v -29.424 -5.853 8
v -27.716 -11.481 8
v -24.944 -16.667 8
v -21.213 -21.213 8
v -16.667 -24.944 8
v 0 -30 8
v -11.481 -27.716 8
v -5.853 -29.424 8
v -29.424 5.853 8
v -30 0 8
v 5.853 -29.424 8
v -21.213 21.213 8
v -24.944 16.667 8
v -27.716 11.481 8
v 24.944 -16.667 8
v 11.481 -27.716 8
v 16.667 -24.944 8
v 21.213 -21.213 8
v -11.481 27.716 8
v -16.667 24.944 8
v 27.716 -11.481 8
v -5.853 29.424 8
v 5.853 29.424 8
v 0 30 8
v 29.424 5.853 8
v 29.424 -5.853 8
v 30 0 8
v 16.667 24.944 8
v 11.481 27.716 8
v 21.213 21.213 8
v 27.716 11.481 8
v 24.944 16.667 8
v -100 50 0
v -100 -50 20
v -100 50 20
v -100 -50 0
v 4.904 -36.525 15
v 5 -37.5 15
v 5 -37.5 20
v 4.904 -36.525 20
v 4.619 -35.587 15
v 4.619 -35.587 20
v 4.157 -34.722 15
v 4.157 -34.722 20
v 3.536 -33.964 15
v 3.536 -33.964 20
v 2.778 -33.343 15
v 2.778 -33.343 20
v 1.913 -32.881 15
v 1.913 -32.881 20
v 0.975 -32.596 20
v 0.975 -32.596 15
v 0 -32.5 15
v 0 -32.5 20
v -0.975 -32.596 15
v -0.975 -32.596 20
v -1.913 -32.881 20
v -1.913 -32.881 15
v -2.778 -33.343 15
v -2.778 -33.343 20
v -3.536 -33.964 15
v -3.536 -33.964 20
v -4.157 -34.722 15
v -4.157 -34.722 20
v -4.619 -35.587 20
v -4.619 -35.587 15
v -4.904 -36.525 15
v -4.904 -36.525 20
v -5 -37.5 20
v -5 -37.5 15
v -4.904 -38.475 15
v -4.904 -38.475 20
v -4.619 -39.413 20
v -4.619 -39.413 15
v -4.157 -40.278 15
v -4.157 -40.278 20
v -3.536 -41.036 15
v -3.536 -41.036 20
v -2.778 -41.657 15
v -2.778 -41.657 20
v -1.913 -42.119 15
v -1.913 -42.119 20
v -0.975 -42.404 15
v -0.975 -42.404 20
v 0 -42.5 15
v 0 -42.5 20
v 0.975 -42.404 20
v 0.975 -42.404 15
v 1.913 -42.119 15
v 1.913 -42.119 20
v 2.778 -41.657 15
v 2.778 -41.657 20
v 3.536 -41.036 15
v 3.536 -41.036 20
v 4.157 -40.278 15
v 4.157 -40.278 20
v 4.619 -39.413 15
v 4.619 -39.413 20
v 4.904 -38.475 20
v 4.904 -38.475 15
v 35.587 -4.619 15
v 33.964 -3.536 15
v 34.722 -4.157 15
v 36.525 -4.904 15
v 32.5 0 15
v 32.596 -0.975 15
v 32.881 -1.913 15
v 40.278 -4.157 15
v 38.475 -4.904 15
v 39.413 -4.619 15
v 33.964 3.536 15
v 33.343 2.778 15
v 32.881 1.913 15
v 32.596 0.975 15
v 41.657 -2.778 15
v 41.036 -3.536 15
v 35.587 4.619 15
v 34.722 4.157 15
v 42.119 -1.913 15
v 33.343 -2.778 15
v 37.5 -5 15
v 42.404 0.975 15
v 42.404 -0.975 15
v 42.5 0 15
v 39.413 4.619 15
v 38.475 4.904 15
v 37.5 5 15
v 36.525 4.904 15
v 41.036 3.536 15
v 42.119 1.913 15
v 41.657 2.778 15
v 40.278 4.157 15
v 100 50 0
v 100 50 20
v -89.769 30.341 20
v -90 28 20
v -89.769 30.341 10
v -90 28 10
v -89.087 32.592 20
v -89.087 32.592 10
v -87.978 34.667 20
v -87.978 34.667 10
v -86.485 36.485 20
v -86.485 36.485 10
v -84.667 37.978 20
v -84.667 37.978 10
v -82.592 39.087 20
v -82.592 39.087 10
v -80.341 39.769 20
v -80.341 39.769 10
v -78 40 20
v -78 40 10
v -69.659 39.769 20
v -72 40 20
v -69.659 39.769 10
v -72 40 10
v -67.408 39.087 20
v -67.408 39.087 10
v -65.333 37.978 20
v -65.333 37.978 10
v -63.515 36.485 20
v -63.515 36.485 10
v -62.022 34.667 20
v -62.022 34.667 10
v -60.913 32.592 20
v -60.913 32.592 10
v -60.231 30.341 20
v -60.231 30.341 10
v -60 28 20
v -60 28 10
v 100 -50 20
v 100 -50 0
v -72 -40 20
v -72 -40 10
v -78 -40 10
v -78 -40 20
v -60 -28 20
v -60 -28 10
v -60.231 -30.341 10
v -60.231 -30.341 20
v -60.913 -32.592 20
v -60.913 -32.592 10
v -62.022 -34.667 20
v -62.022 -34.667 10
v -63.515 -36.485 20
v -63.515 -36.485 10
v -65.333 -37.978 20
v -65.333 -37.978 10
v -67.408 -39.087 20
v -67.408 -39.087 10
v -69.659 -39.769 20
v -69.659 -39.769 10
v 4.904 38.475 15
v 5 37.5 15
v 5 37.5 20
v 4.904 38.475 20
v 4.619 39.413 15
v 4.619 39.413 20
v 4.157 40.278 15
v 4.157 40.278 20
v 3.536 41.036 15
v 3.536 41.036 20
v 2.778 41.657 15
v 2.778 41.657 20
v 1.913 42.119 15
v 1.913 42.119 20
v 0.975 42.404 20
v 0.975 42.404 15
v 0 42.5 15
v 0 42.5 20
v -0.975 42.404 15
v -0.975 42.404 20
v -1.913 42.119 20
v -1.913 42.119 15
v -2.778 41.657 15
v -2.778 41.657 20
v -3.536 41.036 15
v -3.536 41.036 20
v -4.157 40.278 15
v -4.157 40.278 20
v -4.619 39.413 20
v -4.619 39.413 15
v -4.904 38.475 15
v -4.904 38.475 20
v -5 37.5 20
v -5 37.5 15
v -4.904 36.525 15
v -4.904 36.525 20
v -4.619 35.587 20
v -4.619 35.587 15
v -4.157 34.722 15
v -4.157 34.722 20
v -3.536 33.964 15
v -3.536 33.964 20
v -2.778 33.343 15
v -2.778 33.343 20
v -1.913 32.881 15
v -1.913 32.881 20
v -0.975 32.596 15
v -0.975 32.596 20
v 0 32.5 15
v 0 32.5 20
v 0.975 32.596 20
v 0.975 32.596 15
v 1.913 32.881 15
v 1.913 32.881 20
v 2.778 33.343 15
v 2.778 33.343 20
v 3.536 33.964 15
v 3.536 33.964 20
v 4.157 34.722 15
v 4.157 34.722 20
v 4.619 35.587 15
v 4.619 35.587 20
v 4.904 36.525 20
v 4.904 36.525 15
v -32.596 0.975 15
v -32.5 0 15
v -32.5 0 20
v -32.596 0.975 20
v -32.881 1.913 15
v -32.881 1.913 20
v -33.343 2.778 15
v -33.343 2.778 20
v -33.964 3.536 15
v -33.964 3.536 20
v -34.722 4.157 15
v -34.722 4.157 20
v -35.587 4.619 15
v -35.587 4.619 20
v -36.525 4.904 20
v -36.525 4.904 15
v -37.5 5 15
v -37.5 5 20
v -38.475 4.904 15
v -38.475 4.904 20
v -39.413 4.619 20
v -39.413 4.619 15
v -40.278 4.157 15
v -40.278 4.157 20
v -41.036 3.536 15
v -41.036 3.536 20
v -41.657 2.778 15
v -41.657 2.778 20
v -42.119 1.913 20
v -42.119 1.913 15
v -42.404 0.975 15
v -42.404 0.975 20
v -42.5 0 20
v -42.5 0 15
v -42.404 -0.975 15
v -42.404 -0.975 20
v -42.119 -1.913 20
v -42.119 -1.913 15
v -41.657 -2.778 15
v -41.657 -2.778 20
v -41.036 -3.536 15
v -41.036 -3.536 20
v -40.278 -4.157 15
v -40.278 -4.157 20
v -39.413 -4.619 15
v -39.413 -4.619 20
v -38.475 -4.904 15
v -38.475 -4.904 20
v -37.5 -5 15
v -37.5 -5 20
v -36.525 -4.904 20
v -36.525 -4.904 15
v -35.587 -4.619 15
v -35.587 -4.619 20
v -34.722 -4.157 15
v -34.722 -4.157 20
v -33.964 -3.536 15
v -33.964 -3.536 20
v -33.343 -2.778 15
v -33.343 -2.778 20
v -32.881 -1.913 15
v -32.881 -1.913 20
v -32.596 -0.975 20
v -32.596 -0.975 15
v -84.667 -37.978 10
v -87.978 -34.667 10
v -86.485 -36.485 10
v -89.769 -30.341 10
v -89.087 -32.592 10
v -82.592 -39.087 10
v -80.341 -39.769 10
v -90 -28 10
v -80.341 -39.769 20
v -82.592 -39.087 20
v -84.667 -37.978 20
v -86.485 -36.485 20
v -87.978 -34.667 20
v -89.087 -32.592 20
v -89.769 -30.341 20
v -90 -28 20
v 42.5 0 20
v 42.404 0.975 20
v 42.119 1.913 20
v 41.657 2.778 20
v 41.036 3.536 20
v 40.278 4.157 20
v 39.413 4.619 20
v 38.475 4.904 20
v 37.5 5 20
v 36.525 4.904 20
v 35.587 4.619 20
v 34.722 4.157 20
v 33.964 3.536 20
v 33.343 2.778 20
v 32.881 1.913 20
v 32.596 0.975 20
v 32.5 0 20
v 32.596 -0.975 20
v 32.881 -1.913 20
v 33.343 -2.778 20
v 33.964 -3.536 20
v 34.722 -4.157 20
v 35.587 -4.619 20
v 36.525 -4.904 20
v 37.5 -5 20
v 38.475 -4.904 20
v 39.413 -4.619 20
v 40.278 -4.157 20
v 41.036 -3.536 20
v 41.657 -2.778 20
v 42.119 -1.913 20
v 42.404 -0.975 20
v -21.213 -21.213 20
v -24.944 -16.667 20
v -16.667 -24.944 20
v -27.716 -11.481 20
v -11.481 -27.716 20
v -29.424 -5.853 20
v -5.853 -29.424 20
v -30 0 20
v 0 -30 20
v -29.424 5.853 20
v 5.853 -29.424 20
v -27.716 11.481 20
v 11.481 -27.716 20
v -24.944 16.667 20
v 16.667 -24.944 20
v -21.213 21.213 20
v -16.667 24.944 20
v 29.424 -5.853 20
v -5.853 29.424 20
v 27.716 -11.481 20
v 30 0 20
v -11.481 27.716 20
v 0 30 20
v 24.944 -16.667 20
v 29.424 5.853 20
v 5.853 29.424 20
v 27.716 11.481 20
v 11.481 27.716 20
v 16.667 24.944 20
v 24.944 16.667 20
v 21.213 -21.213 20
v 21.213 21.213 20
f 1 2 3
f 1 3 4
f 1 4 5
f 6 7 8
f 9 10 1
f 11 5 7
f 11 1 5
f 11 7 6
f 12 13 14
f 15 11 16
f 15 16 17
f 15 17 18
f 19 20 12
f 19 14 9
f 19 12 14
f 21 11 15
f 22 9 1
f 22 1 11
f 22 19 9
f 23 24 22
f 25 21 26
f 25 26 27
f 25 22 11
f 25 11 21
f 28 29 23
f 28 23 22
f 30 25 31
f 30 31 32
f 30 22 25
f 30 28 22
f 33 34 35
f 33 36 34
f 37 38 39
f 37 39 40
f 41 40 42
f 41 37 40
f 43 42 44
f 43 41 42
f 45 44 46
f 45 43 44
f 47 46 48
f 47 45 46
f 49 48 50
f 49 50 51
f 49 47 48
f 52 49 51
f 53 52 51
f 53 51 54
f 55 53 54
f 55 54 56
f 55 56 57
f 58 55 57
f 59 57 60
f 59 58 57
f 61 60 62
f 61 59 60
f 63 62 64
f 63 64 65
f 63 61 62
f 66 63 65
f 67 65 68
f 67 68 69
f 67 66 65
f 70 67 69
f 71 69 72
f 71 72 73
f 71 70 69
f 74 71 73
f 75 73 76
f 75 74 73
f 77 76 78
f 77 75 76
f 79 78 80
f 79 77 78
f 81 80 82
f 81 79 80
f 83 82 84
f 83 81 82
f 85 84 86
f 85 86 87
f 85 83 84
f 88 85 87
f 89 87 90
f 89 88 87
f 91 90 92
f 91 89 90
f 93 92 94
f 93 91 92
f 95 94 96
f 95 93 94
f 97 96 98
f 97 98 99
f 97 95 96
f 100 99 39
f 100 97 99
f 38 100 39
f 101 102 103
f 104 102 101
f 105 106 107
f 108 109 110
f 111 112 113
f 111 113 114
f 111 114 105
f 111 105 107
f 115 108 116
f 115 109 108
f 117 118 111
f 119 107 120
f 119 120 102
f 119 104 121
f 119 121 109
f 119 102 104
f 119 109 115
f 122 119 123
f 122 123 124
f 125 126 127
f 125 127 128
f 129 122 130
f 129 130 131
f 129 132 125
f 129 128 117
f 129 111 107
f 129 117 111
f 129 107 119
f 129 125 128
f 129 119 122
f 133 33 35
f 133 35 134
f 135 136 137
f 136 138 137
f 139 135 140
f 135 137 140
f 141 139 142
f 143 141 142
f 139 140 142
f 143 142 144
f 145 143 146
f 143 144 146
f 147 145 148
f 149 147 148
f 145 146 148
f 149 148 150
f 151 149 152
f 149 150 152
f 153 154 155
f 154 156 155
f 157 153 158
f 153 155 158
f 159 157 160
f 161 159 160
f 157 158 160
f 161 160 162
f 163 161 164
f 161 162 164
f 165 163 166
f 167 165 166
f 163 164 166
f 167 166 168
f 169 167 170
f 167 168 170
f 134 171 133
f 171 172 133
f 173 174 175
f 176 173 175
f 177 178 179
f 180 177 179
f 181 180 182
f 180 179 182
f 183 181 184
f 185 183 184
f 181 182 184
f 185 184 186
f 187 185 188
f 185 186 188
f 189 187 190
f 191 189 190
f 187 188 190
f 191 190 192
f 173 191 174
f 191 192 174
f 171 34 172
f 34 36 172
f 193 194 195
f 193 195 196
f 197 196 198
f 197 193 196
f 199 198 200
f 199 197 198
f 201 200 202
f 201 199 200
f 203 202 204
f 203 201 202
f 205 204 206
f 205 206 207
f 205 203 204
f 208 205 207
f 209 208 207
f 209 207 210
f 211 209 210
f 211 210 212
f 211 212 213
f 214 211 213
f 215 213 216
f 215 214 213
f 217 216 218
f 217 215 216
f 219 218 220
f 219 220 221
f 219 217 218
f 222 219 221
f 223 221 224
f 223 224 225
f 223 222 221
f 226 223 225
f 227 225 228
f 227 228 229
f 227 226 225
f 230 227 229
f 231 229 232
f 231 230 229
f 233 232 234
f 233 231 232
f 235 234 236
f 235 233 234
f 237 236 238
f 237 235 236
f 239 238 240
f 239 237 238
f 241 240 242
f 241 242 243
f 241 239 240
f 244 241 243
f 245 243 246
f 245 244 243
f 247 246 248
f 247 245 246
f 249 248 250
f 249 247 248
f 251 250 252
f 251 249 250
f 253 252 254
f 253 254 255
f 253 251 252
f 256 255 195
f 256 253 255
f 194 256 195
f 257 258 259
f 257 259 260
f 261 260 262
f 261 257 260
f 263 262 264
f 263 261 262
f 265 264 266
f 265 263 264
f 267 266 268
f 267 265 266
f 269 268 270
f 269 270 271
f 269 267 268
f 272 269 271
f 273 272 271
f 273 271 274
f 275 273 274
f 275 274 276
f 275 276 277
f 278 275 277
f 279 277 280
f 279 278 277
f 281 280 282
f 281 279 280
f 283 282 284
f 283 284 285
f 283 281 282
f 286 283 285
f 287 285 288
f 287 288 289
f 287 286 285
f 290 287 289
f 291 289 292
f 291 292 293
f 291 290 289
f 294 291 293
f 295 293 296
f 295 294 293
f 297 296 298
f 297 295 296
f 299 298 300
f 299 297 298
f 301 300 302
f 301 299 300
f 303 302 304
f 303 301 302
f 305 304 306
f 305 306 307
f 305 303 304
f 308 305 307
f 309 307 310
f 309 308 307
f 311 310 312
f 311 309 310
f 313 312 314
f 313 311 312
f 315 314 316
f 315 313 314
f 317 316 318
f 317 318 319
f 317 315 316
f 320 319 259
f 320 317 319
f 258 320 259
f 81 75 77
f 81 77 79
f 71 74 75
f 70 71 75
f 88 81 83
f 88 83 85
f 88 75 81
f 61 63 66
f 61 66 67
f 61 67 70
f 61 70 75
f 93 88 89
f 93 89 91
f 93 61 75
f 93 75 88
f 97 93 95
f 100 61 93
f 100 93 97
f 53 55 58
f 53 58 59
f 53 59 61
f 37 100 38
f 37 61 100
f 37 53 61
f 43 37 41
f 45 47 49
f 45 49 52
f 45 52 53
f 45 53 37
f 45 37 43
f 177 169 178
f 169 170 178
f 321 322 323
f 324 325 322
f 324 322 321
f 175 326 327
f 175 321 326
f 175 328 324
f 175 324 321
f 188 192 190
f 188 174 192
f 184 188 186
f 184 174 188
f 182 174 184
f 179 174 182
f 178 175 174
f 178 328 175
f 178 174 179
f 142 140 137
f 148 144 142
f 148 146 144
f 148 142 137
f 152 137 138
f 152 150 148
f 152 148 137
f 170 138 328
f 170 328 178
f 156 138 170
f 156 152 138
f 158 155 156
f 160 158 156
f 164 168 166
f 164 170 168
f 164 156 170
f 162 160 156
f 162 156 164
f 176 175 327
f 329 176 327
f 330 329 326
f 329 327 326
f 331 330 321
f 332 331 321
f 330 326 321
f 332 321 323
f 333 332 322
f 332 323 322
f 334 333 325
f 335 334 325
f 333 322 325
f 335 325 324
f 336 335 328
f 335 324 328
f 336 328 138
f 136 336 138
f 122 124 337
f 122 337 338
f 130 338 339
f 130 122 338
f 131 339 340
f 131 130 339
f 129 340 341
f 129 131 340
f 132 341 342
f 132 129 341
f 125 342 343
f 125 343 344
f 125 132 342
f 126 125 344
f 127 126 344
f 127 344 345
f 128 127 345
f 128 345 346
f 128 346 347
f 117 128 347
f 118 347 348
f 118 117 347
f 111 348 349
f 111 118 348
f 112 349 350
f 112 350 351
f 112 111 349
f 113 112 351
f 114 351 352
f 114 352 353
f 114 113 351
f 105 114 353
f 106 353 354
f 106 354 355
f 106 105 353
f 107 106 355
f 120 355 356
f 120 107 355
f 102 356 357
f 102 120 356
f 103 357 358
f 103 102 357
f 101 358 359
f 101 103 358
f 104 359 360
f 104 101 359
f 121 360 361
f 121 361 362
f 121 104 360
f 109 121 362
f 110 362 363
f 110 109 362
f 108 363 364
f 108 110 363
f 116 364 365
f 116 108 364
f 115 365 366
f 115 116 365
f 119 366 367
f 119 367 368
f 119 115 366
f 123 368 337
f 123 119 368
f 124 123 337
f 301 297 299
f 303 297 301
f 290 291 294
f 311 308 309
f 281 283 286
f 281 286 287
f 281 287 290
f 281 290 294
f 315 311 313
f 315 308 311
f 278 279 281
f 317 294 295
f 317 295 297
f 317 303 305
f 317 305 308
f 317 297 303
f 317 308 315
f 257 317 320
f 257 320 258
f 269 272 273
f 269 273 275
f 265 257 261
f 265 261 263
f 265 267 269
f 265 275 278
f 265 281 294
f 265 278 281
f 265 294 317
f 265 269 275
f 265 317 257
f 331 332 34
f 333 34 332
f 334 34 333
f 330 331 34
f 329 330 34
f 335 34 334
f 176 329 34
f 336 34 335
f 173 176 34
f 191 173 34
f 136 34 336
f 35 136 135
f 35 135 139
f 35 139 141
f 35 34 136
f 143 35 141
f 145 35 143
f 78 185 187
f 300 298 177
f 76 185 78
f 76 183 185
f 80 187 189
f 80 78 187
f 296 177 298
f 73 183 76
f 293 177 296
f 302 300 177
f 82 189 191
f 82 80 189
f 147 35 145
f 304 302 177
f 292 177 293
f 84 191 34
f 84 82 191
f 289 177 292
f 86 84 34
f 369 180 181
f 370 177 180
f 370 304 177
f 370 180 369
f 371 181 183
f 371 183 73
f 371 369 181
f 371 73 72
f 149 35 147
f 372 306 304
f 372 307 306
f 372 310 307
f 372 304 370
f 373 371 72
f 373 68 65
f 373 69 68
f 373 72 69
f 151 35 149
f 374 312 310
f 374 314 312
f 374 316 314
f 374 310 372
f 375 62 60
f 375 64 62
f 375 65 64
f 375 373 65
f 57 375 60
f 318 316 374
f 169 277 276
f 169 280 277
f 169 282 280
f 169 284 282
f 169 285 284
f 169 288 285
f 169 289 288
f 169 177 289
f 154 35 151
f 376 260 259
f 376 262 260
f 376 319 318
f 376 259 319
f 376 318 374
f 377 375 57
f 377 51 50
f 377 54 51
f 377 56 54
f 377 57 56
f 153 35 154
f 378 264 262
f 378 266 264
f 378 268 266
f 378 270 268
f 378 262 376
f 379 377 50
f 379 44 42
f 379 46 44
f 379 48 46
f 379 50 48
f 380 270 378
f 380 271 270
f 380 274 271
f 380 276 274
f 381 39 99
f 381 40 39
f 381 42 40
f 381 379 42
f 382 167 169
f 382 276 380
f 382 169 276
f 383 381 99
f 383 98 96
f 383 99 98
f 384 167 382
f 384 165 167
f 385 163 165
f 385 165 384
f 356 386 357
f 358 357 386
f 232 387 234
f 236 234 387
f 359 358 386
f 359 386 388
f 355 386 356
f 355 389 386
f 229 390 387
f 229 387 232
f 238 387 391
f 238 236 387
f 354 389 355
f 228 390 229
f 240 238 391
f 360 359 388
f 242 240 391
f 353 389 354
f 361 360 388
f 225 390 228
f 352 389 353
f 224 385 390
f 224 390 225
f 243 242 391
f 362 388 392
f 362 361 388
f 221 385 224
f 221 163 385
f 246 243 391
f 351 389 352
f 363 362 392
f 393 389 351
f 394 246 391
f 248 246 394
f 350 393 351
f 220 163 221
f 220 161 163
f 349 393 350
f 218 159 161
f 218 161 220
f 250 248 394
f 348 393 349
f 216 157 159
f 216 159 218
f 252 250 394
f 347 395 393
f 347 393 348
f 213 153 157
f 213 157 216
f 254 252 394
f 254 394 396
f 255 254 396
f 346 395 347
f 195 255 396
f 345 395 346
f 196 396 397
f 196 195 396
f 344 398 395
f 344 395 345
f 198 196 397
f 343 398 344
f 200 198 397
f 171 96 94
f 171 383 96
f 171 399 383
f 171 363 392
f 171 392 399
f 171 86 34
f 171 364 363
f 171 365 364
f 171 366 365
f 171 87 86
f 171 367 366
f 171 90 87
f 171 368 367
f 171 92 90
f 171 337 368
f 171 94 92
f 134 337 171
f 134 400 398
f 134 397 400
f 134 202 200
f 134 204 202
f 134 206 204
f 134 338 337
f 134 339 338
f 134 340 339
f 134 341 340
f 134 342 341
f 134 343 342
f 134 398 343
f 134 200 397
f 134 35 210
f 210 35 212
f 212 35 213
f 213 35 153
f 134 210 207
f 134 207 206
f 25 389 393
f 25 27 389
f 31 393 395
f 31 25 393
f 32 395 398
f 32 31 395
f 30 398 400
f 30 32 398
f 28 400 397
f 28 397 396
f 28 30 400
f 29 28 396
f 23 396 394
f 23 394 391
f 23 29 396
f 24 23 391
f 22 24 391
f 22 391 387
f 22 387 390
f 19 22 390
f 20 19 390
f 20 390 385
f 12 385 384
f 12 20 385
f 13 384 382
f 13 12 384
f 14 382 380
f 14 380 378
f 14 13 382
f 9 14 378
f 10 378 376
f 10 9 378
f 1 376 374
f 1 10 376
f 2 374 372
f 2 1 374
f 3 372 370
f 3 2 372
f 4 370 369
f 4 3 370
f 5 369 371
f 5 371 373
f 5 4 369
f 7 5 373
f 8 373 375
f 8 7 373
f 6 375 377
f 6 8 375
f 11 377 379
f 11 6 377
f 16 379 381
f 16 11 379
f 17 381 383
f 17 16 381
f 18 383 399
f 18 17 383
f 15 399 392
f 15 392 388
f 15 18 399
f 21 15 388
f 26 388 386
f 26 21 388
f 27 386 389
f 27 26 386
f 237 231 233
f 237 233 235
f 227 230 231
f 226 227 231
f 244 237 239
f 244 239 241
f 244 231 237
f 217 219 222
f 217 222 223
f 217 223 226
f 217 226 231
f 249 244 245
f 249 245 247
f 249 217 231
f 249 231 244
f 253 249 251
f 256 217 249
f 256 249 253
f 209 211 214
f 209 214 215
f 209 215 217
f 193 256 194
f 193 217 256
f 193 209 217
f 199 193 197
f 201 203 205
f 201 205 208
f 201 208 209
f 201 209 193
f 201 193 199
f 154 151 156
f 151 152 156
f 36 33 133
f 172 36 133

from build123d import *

# Parameters (mm, degrees)
F0_W     = 200
F0_H     = 100
F1_DEPTH = 8
F2_W     = 200
F2_H     = 100
F2_R     = 30
F3_DEPTH = 2
F4_W     = 200
F4_H     = 100
F4_R     = 30
F5_DEPTH = 5
F6_R     = 45
F6_R_2   = 5
F6_R_3   = 30
F7_DEPTH = 5
F8_DEPTH = 5


with BuildPart() as f1:
    # F0 (on Top) → F1 (new body)
    with BuildSketch(Plane.XY):
        Rectangle(F0_W, F0_H)
    extrude(amount=F1_DEPTH)

    # F2 (on face) → F3 (join)
    with BuildSketch(Plane.XY.offset(8)):
        Rectangle(F2_W, F2_H)
        Circle(F2_R, mode=Mode.SUBTRACT)
    extrude(amount=F3_DEPTH)

    # F4 (on face) → F5 (join)
    with BuildSketch(Plane.XY.offset(10)):
        Rectangle(F4_W, F4_H)
        with BuildLine():
            ThreePointArc((-90, 28), (-86.4852813742, 36.4852813742), (-78, 40))
            Line((-78, 40), (-72, 40))
            ThreePointArc((-72, 40), (-63.5147186258, 36.4852813742), (-60, 28))
            Line((-60, 28), (-60, -28))
            ThreePointArc((-60, -28), (-63.5147186258, -36.4852813742), (-72, -40))
            Line((-72, -40), (-78, -40))
            ThreePointArc((-78, -40), (-86.4852813742, -36.4852813742), (-90, -28))
            Line((-90, -28), (-90, 28))
        make_face(mode=Mode.SUBTRACT)
        Circle(F4_R, mode=Mode.SUBTRACT)
    extrude(amount=F5_DEPTH)

    # F6 (on face) → F7 (join)
    with BuildSketch(Plane.XY.offset(15)):
        Circle(F6_R)
        with Locations((0, -37.5)):
            Circle(F6_R_2, mode=Mode.SUBTRACT)
        with Locations((-37.5, 0)):
            Circle(F6_R_2, mode=Mode.SUBTRACT)
        Circle(F6_R_3, mode=Mode.SUBTRACT)
        with Locations((37.5, 0)):
            Circle(F6_R_2, mode=Mode.SUBTRACT)
        with Locations((0, 37.5)):
            Circle(F6_R_2, mode=Mode.SUBTRACT)
    extrude(amount=F7_DEPTH)

    # F8 (add): a face of the model
    f8_faces = [f1.faces().sort_by_distance(p)[0] for p in [
        (97.7639320225, 0, 15),
    ]]
    extrude(f8_faces, amount=F8_DEPTH)


solid = f1.part
